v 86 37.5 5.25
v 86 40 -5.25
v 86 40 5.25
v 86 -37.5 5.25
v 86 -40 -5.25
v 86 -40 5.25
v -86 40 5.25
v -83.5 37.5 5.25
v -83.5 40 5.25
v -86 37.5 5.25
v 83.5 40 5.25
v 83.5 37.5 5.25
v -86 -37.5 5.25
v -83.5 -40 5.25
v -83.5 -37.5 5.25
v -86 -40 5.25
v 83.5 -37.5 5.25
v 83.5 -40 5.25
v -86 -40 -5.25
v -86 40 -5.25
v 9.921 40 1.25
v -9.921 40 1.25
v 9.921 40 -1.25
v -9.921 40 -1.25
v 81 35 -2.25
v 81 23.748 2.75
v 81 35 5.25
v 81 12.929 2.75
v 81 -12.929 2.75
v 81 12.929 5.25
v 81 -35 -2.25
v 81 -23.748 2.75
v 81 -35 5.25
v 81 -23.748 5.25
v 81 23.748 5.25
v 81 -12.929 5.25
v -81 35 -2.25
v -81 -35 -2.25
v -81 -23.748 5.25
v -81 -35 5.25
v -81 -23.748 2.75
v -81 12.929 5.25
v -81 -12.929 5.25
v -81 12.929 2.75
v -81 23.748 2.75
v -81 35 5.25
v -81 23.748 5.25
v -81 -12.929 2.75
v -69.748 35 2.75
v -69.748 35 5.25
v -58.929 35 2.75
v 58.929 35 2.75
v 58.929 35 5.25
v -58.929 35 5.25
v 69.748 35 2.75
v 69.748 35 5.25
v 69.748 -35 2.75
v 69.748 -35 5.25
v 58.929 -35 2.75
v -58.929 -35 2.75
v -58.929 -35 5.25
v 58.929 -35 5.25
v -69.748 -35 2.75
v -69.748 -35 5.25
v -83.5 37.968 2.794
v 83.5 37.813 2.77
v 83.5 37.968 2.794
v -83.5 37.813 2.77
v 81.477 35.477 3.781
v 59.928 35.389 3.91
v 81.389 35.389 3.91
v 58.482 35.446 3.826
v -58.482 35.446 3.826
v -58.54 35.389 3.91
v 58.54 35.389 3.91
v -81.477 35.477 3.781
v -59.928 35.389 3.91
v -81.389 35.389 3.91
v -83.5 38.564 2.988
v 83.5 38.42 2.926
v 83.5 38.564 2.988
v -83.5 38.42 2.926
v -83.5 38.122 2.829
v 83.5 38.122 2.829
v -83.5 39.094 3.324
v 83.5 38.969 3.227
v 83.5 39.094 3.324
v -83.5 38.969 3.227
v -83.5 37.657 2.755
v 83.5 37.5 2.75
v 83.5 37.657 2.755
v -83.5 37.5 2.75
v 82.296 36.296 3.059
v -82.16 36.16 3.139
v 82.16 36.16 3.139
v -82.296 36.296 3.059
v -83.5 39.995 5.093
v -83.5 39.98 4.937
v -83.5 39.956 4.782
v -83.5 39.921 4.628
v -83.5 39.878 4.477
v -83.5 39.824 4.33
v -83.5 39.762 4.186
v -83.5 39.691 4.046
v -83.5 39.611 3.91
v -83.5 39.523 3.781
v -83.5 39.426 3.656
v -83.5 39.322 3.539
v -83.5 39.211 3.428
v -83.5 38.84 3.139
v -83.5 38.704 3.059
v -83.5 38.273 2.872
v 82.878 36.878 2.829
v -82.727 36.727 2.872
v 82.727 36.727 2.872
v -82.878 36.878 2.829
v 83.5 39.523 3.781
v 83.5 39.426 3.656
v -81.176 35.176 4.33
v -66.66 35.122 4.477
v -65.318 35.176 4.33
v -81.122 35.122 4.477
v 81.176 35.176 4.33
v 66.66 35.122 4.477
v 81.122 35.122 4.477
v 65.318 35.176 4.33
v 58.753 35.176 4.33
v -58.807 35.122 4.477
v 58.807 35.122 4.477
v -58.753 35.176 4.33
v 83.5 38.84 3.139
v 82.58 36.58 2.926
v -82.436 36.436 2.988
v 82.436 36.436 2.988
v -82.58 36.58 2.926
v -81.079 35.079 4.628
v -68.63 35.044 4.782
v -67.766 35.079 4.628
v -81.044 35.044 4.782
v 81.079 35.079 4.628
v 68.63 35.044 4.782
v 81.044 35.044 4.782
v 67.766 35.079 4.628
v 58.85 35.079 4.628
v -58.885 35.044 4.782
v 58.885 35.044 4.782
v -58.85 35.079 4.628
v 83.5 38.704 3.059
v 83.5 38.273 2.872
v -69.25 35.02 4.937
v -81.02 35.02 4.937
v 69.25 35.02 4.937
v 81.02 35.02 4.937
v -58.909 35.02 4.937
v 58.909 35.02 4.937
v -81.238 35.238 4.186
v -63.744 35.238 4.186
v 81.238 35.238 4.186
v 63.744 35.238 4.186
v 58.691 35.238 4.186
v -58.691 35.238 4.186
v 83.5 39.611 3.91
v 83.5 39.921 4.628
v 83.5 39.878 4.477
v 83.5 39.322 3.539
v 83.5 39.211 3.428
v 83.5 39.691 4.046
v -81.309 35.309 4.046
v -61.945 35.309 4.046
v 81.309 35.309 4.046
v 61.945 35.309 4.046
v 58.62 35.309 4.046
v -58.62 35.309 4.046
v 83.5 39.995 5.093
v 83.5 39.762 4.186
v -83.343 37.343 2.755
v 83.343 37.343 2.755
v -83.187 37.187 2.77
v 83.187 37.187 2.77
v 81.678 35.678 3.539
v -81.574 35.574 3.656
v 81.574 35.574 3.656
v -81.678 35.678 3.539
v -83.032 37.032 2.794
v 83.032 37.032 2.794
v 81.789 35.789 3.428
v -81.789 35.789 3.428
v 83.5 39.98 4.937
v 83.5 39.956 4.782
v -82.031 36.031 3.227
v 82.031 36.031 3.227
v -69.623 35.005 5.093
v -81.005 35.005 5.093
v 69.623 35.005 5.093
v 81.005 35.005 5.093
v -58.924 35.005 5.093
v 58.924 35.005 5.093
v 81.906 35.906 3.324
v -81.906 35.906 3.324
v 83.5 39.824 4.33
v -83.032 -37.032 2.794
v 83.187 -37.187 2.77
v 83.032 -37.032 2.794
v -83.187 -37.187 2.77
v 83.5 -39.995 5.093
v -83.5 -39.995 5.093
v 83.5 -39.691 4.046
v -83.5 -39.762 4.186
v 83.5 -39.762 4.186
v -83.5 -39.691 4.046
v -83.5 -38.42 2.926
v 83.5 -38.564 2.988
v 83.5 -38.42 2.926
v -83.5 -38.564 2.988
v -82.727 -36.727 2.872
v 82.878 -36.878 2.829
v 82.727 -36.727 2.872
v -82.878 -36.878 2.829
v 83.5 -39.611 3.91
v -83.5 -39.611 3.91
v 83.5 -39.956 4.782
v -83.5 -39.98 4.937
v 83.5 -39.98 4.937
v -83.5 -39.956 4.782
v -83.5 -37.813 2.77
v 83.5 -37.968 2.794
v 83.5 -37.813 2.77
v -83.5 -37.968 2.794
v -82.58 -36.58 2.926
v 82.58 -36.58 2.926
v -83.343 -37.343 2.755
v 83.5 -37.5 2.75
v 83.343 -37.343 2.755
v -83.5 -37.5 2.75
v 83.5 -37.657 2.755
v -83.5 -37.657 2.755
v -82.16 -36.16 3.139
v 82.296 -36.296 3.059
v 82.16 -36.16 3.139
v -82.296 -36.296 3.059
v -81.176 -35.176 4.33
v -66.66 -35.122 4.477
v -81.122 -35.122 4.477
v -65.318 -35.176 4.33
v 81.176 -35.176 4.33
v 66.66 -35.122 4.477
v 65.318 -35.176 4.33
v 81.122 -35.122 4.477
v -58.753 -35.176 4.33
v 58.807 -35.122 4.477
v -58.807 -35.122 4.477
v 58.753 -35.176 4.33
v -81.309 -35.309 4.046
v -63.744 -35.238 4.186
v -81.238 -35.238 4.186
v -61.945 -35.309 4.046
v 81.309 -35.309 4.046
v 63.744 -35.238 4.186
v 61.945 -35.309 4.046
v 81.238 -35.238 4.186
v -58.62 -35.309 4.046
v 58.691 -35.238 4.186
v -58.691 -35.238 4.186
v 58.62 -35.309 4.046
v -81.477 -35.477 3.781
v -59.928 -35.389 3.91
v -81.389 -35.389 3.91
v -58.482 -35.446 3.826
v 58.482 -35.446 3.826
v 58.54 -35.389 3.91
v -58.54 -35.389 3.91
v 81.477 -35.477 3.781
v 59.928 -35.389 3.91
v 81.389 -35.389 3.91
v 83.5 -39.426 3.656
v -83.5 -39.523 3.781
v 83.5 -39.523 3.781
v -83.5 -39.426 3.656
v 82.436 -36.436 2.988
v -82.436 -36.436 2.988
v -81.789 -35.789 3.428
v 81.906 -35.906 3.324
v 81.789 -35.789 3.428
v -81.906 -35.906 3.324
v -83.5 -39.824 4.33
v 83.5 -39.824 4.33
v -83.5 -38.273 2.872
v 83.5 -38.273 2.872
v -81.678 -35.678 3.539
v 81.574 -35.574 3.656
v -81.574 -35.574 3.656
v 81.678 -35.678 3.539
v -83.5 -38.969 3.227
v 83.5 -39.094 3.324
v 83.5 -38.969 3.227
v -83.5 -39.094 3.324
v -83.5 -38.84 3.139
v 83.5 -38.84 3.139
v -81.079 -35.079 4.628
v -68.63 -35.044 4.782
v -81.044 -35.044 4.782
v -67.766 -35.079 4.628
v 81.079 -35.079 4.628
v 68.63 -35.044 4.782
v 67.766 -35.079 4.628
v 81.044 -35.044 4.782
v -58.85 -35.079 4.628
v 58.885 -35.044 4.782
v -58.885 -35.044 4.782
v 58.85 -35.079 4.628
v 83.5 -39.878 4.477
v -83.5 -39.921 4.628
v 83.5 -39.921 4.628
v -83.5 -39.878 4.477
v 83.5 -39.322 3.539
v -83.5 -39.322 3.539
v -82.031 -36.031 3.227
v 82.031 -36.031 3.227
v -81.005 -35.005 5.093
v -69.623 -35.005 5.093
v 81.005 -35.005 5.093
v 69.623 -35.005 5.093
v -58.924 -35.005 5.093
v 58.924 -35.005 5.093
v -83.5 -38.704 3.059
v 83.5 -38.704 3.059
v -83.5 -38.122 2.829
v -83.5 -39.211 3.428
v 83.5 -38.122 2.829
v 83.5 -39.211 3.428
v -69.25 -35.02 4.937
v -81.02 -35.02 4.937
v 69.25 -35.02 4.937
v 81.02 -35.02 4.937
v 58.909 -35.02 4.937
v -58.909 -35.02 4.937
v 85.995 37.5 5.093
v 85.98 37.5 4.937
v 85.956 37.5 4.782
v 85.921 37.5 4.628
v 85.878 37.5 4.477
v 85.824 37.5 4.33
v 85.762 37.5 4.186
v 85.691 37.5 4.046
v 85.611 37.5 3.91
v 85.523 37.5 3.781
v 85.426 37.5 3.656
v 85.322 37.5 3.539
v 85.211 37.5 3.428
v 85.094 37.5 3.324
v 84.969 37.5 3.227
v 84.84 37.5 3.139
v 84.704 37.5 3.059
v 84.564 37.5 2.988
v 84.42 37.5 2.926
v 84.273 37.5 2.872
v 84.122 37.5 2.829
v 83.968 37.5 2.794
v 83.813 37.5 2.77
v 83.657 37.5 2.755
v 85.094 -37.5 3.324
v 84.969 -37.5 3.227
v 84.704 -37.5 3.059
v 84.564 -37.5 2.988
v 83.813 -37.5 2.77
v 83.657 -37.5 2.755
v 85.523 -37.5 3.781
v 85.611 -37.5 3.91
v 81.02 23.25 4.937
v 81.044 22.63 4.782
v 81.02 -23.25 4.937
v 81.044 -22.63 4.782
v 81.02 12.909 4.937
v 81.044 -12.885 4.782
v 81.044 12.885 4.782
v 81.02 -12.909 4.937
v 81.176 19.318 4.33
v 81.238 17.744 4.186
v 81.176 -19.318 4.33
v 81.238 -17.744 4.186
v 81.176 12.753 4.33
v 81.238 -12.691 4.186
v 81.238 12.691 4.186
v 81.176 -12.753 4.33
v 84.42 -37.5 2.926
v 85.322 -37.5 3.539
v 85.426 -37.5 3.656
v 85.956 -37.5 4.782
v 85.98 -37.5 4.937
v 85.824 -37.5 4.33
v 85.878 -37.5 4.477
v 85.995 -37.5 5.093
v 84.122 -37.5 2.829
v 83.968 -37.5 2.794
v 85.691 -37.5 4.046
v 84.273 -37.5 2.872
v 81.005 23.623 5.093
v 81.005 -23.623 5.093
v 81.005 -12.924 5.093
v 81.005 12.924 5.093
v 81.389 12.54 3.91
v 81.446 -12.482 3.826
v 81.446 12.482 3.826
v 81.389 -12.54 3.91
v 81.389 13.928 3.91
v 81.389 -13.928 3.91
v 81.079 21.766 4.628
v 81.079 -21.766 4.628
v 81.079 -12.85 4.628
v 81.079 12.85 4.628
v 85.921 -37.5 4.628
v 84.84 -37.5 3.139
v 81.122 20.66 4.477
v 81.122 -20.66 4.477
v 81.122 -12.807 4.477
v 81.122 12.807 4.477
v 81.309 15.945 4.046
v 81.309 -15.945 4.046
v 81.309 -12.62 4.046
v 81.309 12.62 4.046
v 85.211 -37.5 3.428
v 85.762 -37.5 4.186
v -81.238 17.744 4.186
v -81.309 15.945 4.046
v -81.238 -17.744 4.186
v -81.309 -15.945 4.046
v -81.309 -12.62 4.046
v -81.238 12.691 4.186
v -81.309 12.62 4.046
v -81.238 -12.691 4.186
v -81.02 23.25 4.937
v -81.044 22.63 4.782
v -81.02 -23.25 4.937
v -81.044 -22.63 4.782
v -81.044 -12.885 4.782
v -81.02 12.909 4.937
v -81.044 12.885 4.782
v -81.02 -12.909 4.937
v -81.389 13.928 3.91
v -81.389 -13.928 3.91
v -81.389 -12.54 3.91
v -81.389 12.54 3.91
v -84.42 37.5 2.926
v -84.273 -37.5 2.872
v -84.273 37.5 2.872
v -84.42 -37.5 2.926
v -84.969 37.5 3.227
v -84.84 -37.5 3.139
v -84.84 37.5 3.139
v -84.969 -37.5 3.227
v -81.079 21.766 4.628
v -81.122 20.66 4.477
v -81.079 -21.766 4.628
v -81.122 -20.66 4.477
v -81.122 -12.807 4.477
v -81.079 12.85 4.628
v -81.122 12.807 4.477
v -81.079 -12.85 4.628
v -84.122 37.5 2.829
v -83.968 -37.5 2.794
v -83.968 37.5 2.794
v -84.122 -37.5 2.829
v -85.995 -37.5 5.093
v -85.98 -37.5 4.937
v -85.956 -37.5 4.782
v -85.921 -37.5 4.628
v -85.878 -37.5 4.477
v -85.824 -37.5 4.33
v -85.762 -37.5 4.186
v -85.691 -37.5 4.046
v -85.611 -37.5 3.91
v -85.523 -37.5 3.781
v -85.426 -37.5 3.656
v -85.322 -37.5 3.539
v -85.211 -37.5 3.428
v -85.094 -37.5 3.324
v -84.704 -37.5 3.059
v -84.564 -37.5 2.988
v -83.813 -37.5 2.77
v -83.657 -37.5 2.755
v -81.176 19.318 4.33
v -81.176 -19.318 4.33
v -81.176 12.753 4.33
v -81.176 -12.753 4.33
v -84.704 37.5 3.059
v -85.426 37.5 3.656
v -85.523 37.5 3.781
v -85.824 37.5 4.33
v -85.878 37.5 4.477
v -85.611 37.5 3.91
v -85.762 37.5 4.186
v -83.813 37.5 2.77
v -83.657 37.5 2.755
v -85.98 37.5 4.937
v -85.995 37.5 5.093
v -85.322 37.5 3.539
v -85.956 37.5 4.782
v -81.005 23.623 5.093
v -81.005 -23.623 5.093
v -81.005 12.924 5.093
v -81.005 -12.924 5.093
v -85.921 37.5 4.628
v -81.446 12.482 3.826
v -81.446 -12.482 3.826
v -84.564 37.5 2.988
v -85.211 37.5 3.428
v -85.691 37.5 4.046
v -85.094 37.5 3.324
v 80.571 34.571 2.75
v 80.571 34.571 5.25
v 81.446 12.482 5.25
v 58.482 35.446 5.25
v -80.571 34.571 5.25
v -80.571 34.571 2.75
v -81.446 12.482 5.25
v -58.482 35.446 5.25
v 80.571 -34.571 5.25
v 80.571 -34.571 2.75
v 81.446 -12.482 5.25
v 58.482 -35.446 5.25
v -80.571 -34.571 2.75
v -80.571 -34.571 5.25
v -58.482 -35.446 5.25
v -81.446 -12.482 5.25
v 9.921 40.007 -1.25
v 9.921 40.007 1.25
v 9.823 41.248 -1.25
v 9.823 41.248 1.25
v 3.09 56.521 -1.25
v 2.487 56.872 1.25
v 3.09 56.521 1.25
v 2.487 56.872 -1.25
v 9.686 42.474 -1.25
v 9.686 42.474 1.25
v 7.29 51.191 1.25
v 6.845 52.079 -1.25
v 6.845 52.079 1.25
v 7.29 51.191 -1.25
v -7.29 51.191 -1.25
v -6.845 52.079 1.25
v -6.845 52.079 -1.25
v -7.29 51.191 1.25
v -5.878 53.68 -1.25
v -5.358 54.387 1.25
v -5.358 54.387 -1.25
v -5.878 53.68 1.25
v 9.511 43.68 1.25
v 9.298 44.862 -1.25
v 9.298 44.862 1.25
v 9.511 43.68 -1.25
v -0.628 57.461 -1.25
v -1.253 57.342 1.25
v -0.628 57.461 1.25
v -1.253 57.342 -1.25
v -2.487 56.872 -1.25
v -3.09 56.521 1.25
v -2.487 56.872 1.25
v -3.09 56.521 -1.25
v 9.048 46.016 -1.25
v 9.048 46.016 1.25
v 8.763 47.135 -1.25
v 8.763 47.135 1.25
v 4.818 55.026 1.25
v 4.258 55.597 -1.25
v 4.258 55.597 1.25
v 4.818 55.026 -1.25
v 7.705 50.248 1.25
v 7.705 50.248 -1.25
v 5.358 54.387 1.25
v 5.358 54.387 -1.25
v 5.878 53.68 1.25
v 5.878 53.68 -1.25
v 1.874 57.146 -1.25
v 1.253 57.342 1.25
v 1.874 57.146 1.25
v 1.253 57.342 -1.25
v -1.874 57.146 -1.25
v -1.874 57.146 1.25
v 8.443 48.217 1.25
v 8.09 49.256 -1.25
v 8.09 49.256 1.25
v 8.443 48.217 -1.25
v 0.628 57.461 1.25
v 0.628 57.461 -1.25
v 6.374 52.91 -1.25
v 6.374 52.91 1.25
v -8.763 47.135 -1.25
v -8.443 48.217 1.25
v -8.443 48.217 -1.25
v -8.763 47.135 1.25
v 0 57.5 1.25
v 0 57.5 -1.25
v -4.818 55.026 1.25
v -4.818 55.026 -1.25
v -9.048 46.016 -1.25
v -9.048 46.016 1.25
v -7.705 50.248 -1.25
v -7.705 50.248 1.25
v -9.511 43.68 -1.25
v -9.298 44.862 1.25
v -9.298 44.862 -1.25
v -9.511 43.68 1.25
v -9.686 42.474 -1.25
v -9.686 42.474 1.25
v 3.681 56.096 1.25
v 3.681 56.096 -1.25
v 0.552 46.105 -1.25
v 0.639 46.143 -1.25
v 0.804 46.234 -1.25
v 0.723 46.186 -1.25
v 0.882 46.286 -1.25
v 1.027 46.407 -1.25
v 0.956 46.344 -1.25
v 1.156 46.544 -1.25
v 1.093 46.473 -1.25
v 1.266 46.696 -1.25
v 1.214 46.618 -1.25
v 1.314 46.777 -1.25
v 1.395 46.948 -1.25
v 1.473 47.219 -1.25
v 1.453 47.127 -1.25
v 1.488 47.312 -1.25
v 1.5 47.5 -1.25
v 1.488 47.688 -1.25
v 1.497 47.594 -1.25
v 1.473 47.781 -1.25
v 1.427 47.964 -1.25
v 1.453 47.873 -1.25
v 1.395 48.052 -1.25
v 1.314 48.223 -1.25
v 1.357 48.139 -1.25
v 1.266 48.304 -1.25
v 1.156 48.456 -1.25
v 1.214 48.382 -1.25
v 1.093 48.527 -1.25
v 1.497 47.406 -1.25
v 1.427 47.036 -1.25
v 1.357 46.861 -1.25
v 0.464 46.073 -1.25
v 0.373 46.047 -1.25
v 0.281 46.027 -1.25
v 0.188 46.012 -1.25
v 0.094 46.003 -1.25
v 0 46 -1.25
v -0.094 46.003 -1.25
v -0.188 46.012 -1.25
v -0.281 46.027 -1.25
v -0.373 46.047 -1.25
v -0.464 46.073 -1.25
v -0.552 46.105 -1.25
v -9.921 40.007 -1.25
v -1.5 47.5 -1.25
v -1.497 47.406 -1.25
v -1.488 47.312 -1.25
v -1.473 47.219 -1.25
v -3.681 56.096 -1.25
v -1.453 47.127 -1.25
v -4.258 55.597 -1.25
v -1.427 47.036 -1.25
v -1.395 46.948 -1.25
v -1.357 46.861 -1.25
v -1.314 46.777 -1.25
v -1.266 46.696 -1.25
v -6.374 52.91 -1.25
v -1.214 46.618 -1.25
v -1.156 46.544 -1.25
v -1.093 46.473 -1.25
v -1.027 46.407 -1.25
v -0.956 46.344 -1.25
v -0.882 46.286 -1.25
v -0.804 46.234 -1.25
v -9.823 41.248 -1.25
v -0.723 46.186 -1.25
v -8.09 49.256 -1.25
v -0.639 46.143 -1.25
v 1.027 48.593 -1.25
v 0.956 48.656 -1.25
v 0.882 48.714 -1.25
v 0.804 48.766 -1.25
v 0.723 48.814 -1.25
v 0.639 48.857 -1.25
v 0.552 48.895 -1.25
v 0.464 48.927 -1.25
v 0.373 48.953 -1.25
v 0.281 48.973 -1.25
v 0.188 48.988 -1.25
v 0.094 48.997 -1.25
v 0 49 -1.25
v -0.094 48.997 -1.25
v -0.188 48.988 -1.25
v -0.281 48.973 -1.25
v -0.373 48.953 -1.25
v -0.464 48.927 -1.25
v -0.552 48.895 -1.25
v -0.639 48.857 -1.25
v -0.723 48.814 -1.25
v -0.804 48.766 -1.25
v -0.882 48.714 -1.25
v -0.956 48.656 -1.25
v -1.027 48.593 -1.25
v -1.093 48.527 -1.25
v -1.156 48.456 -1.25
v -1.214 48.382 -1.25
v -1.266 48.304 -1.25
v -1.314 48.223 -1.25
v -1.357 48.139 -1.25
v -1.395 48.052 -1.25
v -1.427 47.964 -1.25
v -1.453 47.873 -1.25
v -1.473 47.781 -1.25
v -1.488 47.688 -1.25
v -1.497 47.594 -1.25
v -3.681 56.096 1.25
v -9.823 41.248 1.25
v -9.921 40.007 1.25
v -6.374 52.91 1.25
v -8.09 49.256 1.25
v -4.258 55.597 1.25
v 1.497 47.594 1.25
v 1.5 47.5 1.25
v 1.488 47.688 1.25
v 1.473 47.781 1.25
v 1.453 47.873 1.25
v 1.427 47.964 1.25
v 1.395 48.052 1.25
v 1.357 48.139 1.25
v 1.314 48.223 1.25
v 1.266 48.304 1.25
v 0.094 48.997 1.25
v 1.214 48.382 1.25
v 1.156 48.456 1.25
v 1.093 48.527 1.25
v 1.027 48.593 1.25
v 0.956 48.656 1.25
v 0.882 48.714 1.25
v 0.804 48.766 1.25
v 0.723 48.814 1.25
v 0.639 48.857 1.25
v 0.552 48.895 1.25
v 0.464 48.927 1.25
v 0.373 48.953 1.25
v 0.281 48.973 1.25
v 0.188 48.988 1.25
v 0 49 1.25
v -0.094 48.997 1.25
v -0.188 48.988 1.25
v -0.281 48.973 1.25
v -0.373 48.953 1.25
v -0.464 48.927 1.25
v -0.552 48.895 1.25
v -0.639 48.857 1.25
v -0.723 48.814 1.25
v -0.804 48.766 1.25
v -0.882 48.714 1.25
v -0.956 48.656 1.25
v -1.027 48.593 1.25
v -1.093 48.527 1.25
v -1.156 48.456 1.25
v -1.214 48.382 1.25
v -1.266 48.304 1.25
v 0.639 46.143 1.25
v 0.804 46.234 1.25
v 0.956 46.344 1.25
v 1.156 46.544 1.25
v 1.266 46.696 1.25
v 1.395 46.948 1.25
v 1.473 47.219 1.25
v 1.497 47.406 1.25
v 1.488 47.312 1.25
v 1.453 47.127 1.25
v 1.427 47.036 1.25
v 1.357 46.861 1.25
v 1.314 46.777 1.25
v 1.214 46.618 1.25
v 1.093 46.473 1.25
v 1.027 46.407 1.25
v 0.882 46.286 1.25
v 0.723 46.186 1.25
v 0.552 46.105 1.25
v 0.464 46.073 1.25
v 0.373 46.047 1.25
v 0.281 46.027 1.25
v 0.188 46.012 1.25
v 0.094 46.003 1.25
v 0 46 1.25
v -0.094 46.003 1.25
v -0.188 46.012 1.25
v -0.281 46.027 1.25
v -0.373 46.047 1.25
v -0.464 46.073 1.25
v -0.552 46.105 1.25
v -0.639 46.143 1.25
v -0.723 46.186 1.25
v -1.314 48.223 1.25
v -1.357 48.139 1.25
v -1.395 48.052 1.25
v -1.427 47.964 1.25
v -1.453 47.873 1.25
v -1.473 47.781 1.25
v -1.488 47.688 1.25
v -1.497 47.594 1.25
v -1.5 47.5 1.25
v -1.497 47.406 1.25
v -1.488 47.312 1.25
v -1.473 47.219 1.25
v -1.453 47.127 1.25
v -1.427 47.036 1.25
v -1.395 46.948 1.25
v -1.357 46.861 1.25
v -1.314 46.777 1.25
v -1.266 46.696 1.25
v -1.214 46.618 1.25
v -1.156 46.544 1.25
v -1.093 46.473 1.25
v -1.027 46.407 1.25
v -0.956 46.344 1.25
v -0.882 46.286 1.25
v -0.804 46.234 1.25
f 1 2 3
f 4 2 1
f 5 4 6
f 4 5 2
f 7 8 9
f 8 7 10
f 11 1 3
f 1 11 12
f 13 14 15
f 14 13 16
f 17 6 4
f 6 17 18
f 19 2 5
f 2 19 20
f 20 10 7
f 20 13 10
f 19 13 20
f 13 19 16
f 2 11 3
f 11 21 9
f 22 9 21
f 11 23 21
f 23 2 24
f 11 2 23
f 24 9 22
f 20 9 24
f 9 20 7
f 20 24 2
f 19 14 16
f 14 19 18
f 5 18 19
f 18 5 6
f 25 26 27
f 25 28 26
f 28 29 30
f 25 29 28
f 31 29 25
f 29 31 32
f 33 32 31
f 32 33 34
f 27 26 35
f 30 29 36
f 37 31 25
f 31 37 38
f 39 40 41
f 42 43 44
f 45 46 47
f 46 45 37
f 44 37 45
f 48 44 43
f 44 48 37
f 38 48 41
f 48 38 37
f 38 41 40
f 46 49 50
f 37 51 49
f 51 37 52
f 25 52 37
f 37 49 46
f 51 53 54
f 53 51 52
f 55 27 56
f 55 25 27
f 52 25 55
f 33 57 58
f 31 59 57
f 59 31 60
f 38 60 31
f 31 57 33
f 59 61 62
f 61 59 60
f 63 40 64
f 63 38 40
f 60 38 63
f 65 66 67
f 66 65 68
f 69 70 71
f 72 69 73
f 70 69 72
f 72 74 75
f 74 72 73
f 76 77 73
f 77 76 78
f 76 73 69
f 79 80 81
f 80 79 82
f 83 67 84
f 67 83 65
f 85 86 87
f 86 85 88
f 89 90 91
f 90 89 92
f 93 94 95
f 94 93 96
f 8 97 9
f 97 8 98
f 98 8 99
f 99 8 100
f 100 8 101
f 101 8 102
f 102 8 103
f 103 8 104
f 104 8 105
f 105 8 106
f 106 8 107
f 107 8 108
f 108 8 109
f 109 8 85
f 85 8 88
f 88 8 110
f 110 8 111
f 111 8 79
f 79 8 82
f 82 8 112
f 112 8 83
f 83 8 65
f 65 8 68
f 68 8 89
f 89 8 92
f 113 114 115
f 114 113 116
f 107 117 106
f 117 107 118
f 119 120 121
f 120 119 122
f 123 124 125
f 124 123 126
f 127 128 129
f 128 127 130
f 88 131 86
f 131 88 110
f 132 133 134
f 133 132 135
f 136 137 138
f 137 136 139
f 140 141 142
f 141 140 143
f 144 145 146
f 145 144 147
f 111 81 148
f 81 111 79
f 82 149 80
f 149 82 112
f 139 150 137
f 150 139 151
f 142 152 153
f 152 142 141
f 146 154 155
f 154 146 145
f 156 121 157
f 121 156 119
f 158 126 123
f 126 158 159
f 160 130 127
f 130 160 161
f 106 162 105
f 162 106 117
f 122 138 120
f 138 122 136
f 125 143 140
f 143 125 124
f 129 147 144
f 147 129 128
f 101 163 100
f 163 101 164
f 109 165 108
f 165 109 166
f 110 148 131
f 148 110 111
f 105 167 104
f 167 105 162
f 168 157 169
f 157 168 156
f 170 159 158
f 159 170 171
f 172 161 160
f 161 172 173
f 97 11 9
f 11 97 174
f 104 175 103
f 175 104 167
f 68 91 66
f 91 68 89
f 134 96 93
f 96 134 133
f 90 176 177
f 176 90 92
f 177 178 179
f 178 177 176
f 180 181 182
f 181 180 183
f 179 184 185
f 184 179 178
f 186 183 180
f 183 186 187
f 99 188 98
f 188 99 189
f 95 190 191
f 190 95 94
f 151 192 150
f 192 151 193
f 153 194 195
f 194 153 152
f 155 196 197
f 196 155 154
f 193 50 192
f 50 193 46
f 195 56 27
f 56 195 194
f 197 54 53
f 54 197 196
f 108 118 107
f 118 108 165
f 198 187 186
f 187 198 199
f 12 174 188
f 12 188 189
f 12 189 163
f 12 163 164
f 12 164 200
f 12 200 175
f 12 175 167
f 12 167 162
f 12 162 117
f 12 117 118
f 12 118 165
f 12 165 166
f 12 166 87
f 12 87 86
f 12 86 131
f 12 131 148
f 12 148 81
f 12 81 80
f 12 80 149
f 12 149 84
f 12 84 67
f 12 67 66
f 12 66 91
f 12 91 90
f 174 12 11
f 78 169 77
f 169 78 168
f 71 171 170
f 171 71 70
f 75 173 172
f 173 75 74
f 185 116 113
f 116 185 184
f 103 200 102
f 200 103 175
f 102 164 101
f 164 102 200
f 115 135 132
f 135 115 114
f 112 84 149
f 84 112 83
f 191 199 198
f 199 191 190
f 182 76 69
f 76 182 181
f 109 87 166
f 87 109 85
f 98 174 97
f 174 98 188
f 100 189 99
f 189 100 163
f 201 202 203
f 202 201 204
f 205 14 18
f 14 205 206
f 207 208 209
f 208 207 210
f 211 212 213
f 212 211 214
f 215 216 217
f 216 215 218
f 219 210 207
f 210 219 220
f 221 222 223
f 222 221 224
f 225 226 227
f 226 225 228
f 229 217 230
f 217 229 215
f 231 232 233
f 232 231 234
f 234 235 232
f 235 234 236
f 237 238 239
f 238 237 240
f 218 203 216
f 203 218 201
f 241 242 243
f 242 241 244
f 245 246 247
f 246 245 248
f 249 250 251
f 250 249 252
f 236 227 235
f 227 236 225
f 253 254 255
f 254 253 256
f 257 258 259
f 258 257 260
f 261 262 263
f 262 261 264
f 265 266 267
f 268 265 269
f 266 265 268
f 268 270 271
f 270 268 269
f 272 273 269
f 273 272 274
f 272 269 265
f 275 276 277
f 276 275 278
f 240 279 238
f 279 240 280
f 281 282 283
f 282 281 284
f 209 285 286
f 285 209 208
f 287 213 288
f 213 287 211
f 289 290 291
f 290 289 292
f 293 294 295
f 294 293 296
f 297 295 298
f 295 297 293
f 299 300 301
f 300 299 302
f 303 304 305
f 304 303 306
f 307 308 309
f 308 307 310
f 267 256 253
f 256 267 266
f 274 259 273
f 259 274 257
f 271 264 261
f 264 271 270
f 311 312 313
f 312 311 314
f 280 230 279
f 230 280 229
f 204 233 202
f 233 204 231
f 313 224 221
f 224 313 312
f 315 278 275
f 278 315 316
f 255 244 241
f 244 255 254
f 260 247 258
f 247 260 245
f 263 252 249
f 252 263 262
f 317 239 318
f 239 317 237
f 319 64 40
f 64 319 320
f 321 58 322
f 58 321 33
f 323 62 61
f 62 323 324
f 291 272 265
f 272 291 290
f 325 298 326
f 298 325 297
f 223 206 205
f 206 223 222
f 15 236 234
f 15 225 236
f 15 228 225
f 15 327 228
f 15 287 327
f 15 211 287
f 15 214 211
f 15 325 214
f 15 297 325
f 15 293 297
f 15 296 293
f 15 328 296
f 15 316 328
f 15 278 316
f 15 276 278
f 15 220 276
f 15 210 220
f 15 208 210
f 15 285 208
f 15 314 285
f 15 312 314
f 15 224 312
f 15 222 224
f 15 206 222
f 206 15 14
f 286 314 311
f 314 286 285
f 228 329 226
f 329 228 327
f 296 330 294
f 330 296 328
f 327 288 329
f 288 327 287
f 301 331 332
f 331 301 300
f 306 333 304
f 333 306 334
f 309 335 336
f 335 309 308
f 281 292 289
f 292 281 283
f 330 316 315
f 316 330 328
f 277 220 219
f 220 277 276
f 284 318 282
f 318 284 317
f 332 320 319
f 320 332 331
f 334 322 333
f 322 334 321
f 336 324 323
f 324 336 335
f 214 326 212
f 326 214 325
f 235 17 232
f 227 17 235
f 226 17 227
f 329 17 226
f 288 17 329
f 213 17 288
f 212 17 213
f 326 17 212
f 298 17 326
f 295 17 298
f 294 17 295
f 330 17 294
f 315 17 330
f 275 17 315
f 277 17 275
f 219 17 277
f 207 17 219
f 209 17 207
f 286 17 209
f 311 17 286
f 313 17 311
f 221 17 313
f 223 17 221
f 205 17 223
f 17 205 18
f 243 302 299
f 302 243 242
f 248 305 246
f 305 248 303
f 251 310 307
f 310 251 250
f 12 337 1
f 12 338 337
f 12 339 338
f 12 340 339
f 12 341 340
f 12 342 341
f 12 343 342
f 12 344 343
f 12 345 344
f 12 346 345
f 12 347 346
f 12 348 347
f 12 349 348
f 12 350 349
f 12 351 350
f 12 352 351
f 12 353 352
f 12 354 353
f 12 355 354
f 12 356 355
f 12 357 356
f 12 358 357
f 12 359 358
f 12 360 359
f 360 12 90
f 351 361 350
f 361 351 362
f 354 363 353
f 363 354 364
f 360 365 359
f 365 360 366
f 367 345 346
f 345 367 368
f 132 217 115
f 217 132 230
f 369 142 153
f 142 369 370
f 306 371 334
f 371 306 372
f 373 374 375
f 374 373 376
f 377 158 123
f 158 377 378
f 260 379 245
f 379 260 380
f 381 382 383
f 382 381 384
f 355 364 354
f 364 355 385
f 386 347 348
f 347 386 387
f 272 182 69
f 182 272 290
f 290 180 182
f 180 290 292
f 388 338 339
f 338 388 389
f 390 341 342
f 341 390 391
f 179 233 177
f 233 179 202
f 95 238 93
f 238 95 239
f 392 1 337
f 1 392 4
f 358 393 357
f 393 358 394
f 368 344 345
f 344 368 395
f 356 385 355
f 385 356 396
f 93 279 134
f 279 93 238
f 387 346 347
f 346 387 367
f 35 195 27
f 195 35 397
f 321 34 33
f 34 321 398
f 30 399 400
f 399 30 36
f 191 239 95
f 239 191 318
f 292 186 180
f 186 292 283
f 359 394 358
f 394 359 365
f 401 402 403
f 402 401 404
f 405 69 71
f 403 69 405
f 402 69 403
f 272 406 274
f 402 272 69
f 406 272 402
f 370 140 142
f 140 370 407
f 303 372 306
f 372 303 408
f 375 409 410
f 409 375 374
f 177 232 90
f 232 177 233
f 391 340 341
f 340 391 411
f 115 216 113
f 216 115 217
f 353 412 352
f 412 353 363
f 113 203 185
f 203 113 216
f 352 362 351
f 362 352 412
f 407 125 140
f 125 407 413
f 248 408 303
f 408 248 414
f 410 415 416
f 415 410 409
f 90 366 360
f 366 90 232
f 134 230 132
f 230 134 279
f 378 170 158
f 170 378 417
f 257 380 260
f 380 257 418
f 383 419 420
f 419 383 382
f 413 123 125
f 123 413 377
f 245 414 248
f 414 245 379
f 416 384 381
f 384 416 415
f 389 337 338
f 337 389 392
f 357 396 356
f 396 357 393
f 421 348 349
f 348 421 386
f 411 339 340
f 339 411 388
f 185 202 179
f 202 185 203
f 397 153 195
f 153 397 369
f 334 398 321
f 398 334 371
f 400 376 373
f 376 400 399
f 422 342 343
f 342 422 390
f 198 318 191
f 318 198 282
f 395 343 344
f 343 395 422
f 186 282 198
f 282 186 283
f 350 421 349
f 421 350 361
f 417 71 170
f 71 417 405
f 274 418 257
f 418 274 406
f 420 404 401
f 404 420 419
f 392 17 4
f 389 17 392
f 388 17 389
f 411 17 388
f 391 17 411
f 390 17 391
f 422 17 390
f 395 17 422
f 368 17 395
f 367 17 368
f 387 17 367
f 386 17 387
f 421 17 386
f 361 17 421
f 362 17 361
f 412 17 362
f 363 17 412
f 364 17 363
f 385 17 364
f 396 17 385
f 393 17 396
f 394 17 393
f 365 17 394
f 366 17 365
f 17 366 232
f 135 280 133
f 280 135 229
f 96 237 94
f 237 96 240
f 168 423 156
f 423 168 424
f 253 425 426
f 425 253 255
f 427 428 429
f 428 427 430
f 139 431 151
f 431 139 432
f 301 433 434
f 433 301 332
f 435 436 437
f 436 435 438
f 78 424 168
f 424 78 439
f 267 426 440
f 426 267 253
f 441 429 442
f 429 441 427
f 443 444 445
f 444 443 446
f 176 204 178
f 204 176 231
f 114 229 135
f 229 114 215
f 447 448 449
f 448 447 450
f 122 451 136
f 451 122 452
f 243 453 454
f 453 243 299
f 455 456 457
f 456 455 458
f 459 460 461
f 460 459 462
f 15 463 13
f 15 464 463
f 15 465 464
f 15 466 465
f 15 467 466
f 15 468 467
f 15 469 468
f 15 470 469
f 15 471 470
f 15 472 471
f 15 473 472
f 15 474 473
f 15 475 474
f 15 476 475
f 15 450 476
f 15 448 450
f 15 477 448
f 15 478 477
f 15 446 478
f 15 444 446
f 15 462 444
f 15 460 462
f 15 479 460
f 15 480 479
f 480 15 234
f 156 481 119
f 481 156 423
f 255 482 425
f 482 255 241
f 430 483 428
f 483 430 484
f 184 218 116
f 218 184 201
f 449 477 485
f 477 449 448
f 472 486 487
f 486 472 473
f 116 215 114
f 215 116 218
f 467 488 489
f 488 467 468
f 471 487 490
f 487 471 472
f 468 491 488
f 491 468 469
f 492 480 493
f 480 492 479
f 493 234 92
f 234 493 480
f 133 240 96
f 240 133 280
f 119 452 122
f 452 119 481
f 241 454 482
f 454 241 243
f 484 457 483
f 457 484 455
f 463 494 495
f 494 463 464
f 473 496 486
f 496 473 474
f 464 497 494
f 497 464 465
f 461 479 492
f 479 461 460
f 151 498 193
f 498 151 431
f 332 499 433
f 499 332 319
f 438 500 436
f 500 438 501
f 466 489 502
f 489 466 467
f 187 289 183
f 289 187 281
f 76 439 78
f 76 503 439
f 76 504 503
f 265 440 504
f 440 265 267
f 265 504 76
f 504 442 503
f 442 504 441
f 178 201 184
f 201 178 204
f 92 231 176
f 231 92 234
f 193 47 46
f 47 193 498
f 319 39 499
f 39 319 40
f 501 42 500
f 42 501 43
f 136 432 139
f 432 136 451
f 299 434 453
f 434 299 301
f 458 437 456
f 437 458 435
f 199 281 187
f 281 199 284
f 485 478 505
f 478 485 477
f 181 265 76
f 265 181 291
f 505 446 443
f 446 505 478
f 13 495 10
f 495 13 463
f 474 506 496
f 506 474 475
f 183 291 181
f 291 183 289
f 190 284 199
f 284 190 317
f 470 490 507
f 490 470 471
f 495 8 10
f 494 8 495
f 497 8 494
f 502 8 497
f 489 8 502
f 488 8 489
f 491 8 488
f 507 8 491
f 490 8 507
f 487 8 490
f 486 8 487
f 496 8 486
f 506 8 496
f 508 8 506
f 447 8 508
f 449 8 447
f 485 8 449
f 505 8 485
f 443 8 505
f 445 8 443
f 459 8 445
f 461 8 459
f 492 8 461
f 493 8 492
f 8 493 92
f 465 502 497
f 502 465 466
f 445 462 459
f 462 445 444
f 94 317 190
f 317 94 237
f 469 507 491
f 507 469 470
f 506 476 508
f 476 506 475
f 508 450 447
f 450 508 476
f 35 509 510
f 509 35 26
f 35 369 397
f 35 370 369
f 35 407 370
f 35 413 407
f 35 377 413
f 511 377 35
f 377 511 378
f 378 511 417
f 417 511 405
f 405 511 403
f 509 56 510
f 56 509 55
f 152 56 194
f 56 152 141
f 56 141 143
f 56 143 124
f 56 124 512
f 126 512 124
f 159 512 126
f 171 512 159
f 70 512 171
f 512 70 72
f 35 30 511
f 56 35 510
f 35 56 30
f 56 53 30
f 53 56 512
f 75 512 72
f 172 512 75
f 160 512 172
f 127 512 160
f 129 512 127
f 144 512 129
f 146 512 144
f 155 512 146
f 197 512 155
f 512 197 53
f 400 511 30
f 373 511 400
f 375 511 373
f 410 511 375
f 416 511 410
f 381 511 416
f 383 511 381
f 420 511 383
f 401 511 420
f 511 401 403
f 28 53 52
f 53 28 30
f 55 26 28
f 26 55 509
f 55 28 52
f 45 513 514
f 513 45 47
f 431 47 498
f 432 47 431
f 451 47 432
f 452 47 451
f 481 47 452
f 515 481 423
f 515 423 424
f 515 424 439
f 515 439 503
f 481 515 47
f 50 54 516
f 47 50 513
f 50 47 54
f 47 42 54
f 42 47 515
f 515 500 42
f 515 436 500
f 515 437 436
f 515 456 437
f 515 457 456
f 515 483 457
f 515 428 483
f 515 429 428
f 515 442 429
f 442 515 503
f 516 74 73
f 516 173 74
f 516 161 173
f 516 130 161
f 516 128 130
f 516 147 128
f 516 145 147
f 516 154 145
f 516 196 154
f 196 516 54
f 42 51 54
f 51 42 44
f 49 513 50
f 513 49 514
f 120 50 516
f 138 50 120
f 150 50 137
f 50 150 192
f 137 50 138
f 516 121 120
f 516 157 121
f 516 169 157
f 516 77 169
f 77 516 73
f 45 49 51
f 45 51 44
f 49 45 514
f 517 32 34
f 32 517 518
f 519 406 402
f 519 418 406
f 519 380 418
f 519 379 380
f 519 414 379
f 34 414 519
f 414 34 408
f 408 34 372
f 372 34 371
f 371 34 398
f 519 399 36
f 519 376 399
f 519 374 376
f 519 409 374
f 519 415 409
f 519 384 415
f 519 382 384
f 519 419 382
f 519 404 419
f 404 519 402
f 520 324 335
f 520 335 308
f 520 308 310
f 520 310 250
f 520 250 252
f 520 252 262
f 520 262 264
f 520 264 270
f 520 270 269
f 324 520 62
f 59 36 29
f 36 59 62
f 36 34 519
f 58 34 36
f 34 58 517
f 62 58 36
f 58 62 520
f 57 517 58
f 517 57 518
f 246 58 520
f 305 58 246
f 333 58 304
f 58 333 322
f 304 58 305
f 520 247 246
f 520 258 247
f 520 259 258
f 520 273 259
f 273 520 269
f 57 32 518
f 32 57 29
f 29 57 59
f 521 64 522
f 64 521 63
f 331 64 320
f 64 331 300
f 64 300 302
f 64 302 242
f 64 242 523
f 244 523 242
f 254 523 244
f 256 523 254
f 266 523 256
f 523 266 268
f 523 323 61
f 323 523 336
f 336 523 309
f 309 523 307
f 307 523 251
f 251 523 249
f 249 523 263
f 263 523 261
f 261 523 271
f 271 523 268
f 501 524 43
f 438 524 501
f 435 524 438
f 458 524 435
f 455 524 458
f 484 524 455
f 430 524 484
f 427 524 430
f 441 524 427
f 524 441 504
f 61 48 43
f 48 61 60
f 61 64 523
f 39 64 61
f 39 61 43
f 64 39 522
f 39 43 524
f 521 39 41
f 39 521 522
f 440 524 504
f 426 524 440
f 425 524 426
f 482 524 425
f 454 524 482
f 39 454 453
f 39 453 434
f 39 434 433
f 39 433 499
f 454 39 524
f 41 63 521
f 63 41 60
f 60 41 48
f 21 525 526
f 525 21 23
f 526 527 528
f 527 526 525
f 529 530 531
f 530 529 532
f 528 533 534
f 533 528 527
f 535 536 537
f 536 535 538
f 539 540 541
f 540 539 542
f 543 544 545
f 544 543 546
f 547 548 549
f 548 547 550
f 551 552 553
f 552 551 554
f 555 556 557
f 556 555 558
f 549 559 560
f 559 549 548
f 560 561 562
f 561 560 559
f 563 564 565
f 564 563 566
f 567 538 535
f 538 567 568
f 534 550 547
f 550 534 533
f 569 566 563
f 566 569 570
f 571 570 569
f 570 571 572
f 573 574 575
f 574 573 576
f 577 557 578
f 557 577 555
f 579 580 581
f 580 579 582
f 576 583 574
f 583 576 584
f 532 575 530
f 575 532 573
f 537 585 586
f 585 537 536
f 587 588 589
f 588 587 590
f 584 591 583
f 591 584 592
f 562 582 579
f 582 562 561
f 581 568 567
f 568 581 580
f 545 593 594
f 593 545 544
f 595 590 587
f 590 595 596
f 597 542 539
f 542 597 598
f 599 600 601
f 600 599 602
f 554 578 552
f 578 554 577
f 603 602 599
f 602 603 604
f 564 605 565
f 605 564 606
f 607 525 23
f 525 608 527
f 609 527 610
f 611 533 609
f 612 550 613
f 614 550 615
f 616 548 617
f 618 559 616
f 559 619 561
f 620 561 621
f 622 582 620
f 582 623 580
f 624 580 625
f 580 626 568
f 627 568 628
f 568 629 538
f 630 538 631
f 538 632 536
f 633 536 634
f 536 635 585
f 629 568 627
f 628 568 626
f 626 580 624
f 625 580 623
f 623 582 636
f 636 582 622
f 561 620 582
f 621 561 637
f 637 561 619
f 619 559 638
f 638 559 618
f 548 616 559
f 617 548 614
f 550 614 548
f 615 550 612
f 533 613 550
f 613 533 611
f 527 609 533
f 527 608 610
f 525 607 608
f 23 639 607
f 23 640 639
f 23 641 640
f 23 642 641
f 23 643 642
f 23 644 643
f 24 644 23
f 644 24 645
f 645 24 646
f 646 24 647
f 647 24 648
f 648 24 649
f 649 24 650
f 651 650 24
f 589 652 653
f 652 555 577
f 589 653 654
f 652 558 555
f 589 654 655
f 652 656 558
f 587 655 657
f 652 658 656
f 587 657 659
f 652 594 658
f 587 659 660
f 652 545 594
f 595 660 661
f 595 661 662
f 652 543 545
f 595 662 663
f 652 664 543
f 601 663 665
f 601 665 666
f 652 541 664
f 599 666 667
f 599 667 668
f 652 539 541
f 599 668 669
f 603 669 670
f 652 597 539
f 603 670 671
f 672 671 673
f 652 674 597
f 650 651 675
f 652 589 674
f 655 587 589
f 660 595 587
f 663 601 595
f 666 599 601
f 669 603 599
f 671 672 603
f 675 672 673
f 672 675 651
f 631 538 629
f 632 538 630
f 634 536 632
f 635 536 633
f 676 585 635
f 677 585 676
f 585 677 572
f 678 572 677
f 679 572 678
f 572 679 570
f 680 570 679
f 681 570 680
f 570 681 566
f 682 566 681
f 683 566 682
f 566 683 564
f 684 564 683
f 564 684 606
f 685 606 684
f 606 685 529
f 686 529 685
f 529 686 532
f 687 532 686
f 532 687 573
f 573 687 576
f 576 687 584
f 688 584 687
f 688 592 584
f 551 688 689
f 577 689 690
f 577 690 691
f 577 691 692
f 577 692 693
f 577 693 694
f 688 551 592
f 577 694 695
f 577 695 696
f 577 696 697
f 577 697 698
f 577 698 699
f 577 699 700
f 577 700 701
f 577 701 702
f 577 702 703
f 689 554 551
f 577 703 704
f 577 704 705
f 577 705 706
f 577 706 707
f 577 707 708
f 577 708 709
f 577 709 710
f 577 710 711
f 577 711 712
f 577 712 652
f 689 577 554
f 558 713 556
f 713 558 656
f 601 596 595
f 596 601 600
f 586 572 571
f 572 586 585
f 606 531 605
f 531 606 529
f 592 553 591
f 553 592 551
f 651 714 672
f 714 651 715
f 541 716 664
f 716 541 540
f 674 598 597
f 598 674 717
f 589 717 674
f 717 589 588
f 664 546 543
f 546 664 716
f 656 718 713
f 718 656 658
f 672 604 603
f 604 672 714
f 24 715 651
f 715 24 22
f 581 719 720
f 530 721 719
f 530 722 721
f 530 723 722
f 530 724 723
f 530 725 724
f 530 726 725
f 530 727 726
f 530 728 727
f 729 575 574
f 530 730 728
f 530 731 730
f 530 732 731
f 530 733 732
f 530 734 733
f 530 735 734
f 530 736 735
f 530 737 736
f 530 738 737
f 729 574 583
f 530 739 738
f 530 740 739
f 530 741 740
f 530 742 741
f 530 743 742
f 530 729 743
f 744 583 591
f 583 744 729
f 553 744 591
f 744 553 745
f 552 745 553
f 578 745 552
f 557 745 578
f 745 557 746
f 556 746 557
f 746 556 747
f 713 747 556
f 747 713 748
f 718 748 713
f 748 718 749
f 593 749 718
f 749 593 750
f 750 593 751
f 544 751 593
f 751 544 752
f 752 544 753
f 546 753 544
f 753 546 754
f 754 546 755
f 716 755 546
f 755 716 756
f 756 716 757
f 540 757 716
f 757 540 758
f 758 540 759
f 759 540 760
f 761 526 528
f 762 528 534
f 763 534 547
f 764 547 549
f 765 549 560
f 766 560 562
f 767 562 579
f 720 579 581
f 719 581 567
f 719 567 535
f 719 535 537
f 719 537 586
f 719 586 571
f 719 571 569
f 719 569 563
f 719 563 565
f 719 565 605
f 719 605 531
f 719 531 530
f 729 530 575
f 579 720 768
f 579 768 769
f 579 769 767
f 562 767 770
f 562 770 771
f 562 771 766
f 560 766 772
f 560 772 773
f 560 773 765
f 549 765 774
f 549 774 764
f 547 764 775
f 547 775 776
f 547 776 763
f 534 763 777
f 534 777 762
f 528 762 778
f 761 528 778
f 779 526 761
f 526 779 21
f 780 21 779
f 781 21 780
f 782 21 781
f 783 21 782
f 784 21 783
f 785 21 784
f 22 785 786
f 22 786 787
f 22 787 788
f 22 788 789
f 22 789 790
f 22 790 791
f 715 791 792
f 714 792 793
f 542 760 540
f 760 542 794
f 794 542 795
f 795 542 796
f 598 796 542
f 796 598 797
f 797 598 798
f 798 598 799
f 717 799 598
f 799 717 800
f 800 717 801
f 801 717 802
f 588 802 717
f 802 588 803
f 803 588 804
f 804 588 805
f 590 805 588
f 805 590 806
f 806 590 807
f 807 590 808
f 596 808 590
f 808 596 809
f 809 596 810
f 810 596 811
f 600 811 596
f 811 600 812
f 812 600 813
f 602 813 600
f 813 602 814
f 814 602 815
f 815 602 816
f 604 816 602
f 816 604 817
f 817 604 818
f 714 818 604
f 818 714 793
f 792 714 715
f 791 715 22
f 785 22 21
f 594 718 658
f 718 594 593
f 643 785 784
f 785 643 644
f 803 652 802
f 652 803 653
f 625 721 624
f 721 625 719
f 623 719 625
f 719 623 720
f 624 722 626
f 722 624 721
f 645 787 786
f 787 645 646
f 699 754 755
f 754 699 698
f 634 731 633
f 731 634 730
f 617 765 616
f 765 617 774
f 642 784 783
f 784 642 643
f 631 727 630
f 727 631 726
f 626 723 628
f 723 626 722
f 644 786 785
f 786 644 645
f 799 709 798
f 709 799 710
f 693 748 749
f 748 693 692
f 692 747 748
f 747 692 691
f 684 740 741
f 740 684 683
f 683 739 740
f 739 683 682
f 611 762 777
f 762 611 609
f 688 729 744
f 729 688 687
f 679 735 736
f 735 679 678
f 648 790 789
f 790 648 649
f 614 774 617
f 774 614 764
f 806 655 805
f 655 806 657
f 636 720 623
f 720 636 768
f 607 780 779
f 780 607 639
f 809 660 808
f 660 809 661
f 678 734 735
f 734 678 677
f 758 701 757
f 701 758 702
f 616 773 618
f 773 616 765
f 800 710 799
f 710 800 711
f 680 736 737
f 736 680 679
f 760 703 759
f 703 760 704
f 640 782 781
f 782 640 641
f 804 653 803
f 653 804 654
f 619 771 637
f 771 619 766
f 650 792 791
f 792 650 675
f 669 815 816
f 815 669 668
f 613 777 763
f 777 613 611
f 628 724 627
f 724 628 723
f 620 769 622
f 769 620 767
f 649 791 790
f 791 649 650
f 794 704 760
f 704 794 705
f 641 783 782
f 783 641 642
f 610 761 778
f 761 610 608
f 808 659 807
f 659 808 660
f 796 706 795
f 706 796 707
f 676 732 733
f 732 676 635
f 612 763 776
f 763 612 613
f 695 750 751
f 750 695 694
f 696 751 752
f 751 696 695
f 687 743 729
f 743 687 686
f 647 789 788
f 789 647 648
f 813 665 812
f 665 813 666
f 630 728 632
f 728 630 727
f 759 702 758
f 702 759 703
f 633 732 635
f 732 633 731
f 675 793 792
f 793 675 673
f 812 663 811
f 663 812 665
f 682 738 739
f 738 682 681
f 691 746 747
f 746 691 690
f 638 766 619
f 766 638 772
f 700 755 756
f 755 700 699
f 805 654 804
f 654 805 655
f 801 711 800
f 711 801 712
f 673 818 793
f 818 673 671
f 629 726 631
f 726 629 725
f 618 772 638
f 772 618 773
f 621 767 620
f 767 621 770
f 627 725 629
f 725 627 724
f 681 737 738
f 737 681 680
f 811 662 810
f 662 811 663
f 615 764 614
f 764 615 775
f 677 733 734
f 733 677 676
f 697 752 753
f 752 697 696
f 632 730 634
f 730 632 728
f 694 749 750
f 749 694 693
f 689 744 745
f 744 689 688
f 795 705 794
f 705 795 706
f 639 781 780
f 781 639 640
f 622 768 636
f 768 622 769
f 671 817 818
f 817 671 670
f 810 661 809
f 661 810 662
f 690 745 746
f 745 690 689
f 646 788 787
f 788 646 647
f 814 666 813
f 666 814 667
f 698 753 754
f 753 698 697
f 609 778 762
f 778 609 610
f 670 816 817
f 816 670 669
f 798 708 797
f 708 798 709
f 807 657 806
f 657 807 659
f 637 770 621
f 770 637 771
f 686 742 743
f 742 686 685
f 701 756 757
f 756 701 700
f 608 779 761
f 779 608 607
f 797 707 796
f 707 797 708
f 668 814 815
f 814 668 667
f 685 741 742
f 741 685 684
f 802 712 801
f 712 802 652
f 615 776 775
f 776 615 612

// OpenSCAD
billLength = 162;
billWidth = 70;
billThick = 5;
frameThickX = 5;
frameThickY = 5;
frameShapeStyle = 1;
frameThick = 3;
botThick = 2.5;
triangleThick = 2.5;
triangleLength = 20;
triangleWidth = 37.5;
triangleMode = 3;
hookLength = 20;
hookWidth = 20;
hookThick = 2.5;
hookHole = 3;
hookHoleUp = 0;
sfn = 100;
extraCut = 1;


module frame() {
    difference() {
        cube([billLength + frameThickX*2, billWidth + frameThickY*2, frameThick+botThick+billThick], center=true);
        translate([0,0,botThick/2+1]) {
            cube([billLength, billWidth,  frameThick+billThick+1], center=true);
        }
    }
}




module frameShapeX() {
    rotate([0,90,0]) {
        cylinder(r=frameThickX/2, h=billLength+frameThickX*frameShapeStyle, center=true, $fn=sfn);
    }
}
module frameShapeY() {
    rotate([90,0,0]) {
        cylinder(r=frameThickY/2, h=billWidth+frameThickY*frameShapeStyle, center=true, $fn=sfn);
    }
}


module frameTriangle() {
    scale([1,triangleWidth/triangleLength, 1]) {
        cylinder(r=triangleLength/2, h=triangleThick, center=true, $fn=3);
    }
}

module frameShapingX() {
    translate([0,(billWidth+frameThickY)/2,(billThick+botThick+frameThick)/2]) {
        frameShapeX();
    }
    translate([0,(billWidth+frameThickY)/-2,(billThick+botThick+frameThick)/2]) {
        frameShapeX();
    }
}

module frameShapingY() {
    translate([(billLength+frameThickX)/2,0,(billThick+botThick+frameThick)/2]) {
        frameShapeY();
    }
    translate([(billLength+frameThickX)/-2,0/-2,(billThick+botThick+frameThick)/2]) {
        frameShapeY();
    }
}


module frameTriangles() {
    translate([(billLength-frameThickX*triangleMode)/2,(billWidth-frameThickY*triangleMode)/2, (billThick+botThick+frameThick-triangleThick)/2]) {
        rotate([0,0,45]) {
            frameTriangle();
        }
        
    }
    translate([(billLength-frameThickX*triangleMode)/-2,(billWidth-frameThickY*triangleMode)/2, (billThick+botThick+frameThick-triangleThick)/2]) {
        rotate([0,0,135]) {
            frameTriangle();
        }
        
    }
    
    translate([(billLength-frameThickX*triangleMode)/2,(billWidth-frameThickY*triangleMode)/-2, (billThick+botThick+frameThick-triangleThick)/2]) {
        rotate([0,0,315]) {
            frameTriangle();
        }
        
    }
    translate([(billLength-frameThickX*triangleMode)/-2,(billWidth-frameThickY*triangleMode)/-2, (billThick+botThick+frameThick-triangleThick)/2]) {
        rotate([0,0,225]) {
            frameTriangle();
        }
        
    }
}
module shapedFrame() {
    difference() {
        frame();
        frameShapingX();
        frameShapingY();
    }
}


module hook() {
    translate([0,(billWidth+frameThickY)/2,0]) {
        difference() {
            scale([1,hookLength*2/hookWidth, 1]) {
                cylinder(r=hookWidth/2, h=hookThick, center=true, $fn=sfn);
            }
            translate([0,hookLength/-2,0]) {
                cube([hookWidth+extraCut,hookLength, hookThick+extraCut], center=true);
            }
            translate([0,hookLength/2+hookHoleUp,0]) {
                cylinder(r=hookHole/2, h=hookThick+extraCut, center=true, $fn=sfn);
        }
        }
    }
}

module fullFrame() {
    shapedFrame();
    frameTriangles();
    hook();

}

fullFrame();
